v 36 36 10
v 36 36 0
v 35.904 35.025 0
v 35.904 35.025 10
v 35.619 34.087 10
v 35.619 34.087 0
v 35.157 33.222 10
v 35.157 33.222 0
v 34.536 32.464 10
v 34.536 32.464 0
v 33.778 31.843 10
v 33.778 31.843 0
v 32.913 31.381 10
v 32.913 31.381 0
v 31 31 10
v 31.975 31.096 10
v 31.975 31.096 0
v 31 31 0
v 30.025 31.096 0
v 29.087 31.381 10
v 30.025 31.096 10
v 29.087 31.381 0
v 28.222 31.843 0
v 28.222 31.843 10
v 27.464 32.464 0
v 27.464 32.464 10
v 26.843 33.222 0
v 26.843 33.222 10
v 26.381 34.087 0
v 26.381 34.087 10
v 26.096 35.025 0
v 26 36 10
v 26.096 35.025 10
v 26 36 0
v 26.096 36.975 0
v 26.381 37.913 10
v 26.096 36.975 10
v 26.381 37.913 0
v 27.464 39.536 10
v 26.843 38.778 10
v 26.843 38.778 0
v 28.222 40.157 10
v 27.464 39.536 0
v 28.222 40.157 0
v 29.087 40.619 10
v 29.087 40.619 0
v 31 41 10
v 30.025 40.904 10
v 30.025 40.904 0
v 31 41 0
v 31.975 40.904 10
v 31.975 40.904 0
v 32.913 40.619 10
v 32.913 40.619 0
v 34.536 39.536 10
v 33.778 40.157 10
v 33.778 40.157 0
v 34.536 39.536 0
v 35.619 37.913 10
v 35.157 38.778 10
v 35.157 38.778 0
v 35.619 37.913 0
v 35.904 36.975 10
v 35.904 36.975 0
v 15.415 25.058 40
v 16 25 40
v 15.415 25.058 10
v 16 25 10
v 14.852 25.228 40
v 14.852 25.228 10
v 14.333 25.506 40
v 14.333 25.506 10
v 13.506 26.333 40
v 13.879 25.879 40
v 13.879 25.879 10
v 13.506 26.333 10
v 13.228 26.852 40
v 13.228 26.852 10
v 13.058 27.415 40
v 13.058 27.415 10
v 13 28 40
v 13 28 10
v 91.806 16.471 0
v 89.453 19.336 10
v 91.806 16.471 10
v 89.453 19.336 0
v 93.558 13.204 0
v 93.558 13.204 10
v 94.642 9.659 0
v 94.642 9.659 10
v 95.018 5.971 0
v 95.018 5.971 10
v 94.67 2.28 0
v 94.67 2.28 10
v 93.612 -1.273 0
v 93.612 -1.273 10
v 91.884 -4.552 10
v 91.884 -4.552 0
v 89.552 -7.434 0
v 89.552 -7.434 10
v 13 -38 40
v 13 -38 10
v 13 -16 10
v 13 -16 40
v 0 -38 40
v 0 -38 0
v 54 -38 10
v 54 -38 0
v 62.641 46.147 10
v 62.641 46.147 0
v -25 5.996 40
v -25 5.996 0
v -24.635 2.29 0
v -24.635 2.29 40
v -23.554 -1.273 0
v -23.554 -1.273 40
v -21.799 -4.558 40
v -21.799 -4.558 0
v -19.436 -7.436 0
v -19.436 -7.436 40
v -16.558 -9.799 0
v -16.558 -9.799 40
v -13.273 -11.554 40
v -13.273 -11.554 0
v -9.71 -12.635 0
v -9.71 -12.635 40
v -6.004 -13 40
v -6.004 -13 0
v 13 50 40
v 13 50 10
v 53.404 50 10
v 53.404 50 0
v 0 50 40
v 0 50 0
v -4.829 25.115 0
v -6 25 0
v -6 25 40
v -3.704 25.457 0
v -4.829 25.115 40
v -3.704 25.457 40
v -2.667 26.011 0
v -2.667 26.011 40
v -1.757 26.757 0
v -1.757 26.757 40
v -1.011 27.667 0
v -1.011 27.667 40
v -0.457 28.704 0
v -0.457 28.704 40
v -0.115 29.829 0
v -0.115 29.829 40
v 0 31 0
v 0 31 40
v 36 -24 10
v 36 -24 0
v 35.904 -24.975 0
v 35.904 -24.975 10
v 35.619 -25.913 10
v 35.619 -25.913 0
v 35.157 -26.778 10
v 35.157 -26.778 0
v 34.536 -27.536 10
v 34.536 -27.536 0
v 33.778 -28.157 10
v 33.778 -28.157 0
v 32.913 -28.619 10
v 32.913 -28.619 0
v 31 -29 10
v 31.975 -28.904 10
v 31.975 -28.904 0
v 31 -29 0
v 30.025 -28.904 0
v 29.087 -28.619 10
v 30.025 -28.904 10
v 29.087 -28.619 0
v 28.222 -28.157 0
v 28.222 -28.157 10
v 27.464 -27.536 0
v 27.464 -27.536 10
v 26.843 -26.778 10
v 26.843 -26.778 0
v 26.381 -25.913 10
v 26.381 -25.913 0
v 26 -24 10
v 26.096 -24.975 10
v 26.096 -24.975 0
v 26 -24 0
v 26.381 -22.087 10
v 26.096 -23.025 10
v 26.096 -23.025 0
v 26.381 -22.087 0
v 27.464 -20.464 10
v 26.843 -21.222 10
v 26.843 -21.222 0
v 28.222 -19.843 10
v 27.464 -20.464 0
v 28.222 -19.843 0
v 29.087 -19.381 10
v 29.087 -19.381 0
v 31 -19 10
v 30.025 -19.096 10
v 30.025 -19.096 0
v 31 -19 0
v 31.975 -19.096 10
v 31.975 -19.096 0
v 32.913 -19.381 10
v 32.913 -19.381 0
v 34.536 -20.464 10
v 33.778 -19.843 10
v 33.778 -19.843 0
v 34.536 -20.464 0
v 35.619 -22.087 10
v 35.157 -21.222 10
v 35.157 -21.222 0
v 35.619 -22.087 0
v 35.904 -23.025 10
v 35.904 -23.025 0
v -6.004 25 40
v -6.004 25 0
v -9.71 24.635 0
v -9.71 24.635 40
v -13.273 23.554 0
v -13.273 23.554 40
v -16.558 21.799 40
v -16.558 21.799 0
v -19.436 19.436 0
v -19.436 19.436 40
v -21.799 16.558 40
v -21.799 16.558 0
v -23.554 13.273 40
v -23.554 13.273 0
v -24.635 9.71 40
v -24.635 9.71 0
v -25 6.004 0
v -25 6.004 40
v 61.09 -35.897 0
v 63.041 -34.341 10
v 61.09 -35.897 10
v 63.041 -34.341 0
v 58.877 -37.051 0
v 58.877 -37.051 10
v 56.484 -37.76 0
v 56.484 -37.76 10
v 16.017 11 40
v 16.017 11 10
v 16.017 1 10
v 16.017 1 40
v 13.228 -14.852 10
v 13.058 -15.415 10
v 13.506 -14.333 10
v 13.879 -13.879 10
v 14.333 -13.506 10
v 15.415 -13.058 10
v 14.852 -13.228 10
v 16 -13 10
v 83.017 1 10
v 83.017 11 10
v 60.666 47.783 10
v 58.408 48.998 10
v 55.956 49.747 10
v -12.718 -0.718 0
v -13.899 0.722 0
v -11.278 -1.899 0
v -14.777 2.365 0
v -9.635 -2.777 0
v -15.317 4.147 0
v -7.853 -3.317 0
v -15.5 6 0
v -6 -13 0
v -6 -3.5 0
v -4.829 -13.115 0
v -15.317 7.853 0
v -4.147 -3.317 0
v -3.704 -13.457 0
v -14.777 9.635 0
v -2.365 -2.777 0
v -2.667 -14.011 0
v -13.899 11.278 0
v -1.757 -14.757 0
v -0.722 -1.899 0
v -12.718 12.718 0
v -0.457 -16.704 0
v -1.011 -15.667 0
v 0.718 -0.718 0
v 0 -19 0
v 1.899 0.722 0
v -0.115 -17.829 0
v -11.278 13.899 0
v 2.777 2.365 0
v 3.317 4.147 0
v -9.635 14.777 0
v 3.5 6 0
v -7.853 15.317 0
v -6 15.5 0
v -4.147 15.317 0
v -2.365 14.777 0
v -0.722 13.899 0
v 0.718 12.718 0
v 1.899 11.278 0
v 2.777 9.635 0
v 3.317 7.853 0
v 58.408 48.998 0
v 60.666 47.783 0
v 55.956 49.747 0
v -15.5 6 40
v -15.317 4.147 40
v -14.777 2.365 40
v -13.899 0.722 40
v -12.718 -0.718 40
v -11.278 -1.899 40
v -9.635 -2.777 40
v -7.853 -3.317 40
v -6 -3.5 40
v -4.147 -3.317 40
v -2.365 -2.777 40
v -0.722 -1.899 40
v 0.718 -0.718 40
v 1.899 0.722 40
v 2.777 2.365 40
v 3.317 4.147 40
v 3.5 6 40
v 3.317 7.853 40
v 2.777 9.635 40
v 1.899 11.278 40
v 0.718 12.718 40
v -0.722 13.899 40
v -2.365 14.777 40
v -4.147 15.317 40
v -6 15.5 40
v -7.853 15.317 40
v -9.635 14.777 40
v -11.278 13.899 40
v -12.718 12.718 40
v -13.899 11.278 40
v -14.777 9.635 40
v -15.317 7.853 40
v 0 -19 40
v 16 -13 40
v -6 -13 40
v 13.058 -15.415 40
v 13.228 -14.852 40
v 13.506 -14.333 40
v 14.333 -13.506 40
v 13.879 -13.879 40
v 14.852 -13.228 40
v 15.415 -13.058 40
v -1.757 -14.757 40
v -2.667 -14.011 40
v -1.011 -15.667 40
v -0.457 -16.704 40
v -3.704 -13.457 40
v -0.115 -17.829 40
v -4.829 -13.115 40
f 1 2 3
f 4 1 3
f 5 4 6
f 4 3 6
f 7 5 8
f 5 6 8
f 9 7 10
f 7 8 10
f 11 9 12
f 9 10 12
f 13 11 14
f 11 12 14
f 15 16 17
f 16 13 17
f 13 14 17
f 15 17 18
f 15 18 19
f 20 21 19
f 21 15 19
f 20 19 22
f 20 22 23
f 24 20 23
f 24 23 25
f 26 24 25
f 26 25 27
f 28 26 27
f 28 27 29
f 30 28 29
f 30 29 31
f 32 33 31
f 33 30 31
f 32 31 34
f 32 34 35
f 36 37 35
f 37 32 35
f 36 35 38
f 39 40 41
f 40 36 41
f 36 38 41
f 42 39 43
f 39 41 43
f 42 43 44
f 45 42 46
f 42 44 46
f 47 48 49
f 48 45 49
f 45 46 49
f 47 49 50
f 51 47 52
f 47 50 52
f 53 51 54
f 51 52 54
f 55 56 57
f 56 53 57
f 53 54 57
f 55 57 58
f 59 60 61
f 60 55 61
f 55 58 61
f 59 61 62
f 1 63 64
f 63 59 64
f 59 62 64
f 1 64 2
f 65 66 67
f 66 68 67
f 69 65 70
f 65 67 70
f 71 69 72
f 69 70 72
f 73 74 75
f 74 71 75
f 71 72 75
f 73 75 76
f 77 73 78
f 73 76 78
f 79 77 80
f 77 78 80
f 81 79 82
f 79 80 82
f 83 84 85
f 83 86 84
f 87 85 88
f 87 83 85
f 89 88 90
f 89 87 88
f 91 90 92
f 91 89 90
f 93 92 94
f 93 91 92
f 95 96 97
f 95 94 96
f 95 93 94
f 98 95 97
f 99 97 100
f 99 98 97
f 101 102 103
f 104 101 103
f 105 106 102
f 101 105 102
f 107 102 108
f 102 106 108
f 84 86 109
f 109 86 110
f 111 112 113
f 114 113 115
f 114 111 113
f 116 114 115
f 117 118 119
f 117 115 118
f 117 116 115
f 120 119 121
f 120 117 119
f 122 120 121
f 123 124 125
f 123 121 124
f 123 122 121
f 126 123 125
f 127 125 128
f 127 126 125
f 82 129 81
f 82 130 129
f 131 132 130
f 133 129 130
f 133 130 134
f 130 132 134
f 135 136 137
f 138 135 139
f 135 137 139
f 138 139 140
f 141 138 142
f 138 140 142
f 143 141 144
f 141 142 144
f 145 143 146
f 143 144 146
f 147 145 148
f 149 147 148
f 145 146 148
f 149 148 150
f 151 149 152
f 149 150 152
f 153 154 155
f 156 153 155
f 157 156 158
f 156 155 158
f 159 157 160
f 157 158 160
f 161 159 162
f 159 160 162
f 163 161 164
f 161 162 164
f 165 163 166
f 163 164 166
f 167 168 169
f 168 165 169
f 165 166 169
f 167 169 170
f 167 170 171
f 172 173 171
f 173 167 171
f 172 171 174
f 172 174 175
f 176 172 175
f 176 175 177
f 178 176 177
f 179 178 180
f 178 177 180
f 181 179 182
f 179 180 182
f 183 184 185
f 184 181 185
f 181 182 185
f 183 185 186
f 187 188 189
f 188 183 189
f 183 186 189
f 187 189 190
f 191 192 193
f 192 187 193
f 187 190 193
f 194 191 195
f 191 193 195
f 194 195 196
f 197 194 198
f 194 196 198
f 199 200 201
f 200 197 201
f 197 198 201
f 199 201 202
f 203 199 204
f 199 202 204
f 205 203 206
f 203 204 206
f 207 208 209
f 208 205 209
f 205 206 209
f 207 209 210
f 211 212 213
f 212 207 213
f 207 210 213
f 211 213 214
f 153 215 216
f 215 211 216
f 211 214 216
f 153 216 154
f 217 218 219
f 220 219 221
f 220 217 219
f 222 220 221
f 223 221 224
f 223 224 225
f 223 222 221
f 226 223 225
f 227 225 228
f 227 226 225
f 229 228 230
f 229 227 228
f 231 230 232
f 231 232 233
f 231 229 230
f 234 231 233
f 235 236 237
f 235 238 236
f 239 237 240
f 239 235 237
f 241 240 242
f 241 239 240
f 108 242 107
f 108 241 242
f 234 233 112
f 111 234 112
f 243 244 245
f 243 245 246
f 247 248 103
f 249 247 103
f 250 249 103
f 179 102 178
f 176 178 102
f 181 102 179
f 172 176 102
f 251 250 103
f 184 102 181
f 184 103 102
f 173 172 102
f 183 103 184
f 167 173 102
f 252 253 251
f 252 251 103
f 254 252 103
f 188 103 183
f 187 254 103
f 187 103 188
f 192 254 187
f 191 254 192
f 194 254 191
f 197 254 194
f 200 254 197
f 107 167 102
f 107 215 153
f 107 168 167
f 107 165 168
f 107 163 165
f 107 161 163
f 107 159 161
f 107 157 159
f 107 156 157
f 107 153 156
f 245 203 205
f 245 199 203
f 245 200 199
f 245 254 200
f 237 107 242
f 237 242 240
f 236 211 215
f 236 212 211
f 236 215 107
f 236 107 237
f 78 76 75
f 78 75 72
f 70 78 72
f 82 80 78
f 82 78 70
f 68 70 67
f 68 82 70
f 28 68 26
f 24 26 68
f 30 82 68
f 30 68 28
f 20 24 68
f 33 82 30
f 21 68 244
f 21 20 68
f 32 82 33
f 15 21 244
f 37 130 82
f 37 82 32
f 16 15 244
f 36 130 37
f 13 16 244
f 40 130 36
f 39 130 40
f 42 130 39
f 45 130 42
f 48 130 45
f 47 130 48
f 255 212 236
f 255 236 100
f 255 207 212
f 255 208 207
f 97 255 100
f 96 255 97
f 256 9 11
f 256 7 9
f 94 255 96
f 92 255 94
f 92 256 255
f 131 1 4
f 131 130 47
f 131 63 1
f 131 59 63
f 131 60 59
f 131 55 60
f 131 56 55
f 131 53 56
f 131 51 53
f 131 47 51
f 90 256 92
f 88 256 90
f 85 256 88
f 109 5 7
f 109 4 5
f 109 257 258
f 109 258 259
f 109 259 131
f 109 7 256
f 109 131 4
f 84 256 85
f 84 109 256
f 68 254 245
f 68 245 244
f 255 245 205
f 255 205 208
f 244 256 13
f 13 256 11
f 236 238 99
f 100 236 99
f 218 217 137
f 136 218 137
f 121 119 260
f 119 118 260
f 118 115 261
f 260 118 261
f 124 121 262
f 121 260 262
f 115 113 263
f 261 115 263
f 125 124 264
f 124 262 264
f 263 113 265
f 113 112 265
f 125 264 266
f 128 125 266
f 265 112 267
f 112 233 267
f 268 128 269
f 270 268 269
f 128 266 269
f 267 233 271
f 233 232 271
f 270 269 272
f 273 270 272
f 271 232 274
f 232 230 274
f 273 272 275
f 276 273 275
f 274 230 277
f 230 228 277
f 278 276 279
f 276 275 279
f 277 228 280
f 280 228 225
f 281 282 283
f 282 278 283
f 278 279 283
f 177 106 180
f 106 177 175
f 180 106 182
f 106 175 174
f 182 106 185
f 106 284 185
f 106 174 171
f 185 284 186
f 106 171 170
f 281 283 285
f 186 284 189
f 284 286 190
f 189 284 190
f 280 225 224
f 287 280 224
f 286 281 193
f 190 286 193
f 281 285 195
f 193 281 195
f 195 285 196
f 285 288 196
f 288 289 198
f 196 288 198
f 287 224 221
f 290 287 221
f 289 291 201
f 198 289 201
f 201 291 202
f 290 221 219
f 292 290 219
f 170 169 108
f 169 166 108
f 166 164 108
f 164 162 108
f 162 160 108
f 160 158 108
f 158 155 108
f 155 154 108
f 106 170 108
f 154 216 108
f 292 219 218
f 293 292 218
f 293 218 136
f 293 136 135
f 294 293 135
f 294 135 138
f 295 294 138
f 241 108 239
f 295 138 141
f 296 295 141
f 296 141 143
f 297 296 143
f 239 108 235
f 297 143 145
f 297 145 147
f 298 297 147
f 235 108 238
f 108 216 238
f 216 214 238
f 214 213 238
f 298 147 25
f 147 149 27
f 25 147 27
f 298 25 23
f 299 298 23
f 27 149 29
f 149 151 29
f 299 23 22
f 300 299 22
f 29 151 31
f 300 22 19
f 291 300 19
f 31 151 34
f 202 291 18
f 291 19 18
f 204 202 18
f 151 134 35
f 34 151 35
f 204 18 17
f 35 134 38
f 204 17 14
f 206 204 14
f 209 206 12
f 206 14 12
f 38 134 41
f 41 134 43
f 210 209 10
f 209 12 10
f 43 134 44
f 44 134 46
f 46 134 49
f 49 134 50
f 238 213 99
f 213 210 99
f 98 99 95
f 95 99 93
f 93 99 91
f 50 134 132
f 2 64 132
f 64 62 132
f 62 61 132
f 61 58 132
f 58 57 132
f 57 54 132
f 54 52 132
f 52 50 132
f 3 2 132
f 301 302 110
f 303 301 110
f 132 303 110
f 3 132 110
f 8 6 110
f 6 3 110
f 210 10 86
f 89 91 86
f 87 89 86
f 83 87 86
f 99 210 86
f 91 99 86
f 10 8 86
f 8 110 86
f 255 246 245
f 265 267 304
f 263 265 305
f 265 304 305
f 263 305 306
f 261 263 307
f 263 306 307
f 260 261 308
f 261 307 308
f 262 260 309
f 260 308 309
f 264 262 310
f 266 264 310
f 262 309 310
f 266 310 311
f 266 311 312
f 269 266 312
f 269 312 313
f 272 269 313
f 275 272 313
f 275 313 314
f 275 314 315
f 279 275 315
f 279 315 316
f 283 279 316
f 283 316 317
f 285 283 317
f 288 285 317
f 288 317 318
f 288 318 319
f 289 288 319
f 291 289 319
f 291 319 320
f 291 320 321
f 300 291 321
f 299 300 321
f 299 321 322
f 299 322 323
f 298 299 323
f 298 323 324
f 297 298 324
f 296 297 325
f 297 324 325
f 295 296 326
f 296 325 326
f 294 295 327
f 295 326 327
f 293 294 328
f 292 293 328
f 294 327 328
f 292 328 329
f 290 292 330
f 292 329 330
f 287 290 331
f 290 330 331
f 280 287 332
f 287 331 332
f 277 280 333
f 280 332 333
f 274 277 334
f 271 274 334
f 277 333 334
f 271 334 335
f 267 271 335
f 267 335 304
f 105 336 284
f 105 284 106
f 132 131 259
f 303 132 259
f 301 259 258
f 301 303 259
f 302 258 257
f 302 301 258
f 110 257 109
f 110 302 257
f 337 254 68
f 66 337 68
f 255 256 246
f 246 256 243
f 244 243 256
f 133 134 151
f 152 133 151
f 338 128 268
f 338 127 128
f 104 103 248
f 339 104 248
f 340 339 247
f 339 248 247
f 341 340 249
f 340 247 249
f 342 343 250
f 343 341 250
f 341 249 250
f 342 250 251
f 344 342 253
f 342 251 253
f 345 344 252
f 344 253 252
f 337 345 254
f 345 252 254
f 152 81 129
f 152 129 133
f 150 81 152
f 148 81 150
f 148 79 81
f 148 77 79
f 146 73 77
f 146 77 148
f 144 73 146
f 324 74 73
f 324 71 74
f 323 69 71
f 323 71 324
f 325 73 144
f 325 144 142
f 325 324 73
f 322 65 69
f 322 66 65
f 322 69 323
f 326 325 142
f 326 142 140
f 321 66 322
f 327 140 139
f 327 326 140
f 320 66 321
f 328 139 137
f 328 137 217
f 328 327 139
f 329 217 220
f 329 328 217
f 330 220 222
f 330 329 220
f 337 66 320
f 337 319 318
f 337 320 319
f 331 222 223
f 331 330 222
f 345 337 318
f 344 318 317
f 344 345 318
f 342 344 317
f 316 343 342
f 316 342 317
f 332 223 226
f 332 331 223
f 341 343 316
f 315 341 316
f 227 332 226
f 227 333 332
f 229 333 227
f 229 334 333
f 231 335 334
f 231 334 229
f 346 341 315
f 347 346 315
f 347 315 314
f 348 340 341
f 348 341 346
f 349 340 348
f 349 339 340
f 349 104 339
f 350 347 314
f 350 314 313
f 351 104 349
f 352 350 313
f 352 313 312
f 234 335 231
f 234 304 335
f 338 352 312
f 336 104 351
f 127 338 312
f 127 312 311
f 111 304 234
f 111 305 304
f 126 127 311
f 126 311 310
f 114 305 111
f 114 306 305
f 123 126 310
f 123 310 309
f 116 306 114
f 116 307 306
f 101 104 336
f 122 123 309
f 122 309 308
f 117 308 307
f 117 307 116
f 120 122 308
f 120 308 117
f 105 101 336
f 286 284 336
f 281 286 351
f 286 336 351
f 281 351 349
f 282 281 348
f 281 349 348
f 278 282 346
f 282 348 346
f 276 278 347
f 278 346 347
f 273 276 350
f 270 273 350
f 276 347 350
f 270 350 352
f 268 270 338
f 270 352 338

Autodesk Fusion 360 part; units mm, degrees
sketch "Sketch1" plane through (0, 0, 0) normal (0, 0, 1) x (1, 0, 0)
  line L0 (0, 50) -> (53.404, 50)
  line L1 (54, -38) -> (0, -38)
  line L2 (0, -38) -> (0, 50)
  arc A0 (54, -38) -> (63.0412, -34.3412) centre (54, -25) ccw
  arc A1 (62.6413, 46.1473) -> (53.404, 50) centre (53.404, 37) ccw
  line L3 (63.0412, -34.3412) -> (89.552, -7.4343)
  line L4 (89.4528, 19.3358) -> (62.6413, 46.1473)
  arc A2 (89.552, -7.4343) -> (89.4528, 19.3358) centre (76.0178, 5.9008) ccw
  circle A3 centre (31, -24) radius 5
  circle A4 centre (31, 36) radius 5
  dimension "d2" = 88
  dimension "d6" = 13
  dimension "d7" = 13
  dimension "d10" = 19
  dimension "d13" = 10
  dimension "d15" = 10
extrude "Extrude1" add sketch "Sketch1" along normal blind 10 makes body 1
sketch "Sketch2" plane through (0, 0, 10) normal (0, 0, 1) x (-1, 0, 0)
  circle A0 centre (-31, -36) radius 5
  circle A1 centre (-31, 24) radius 5
  arc A2 (-54, 38) -> (-63.0412, 34.3412) centre (-54, 25) ccw
  line L0 (-63.0412, 34.3412) -> (-89.552, 7.4343)
  arc A3 (-89.552, 7.4343) -> (-89.4528, -19.3358) centre (-76.0178, -5.9008) ccw
  line L1 (-89.4528, -19.3358) -> (-62.6413, -46.1473)
  arc A4 (-62.6413, -46.1473) -> (-53.404, -50) centre (-53.404, -37) ccw
  line L2 (-53.404, -50) -> (0, -50)
  line L3 (0, -50) -> (0, 38)
  line L4 (0, 38) -> (-54, 38)
  line L5 (0, 38) -> (-13, 38)
  line L6 (-13, 38) -> (-13, 16)
  line L7 (0, 13) -> (0, 38)
  line L8 (0, -50) -> (-13, -50)
  line L9 (-13, -50) -> (-13, -28)
  line L10 (0, -25) -> (0, -50)
  line L11 (-13, -25) -> (-16, -25)
  line L12 (-16, -25) -> (-16, -25)
  line L13 (25, -25) -> (25, 13)
  line L14 (-16, 13) -> (-16, 13)
  line L15 (-16, 13) -> (-16, -25)
  arc A5 (-16, 13) -> (-13, 16) centre (-16, 16) ccw
  arc A6 (-13, -28) -> (-16, -25) centre (-16, -28) ccw
  line L16 (25, 13) -> (6, 13)
  line L17 (25, -25) -> (0, -25)
  line L18 (0, -50) -> (0, -31)
  line L19 (6, -25) -> (25, -25)
  line L20 (25, -25) -> (25, 13)
  line L21 (25, 13) -> (0, 13)
  line L22 (0, 19) -> (0, 38)
  arc A7 (0, 19) -> (6, 13) centre (6, 19) ccw
  arc A8 (6, -25) -> (0, -31) centre (6, -31) ccw
  dimension "d18" = 13
  dimension "d19" = 25
  dimension "d20" = 13
  dimension "d21" = 25
  dimension "d23" = 41
  dimension "d24" = 3
  dimension "d25" = 3
  dimension "d26" = 6
  dimension "d27" = 6
extrude "Extrude2" add sketch "Sketch2" against normal blind 10 contours L3 L7 L21 A7 | L3 L13 L16 L17 L19 L20 L21 | L3 L10 L17 A8 bodies 1
extrude "Extrude3" add sketch "Sketch2" along normal blind 30 contours L3 L7 L21 A7 | L3 L13 L16 L17 L19 L20 L21 | L3 L10 L17 A8 bodies 1
extrude "Extrude4" add sketch "Sketch2" along normal blind 30 contours L2 L3 L4 L5 L6 L7 L8 L9 L10 L15 A5 A6 L18 L22 bodies 1
fillet "Fillet1" radius 19 2 edges at (-25, -13, 20) (-25, 25, 20) on bodies 1
sketch "Sketch3" plane through (0, 0, 40) normal (0, 0, 1) x (-1, 0, 0)
  arc A0 (6, -25) -> (25, -6) centre (6, -6) ccw
  arc A1 (25, -6) -> (6, 13) centre (6, -6) ccw
  arc A2 (0, 19) -> (6, 13) centre (6, 19) ccw
  line L0 (0, 19) -> (0, 38)
  line L1 (0, 38) -> (-13, 38)
  line L2 (-13, 38) -> (-13, 16)
  arc A3 (-16, 13) -> (-13, 16) centre (-16, 16) ccw
  line L3 (-16, 13) -> (-16, -25)
  arc A4 (-13, -28) -> (-16, -25) centre (-16, -28) ccw
  line L4 (-13, -28) -> (-13, -50)
  line L5 (-13, -50) -> (0, -50)
  line L6 (0, -50) -> (0, -31)
  arc A5 (6, -25) -> (0, -31) centre (6, -31) ccw
  circle A6 centre (6, -6) radius 9.5
  dimension "d36" = 19
extrude "Extrude5" cut sketch "Sketch3" against normal blind 40 contours A6 bodies 1
sketch "Sketch4" plane through (0, -38, 0) normal (0, -1, 0) x (1, 0, 0)
  line L0 (0, 0) -> (54, 0)
  line L1 (54, 0) -> (54, 10)
  line L2 (54, 10) -> (13, 10)
  line L3 (13, 10) -> (13, 40)
  line L4 (13, 40) -> (0, 40)
  line L5 (0, 40) -> (0, 0)
  line L6 (16.0173, 10) -> (83.0173, 10)
  line L7 (16.0173, 10) -> (16.0173, 40)
  line L8 (83.0173, 10) -> (16.0173, 40)
  dimension "d39" = 67
  dimension "d40" = 30
extrude "Extrude6" add sketch "Sketch4" along normal blind 10 separate body contours L2 L6 L7 L8 makes body 2
move_body "Move1" bodies 2 to x (1, 0, 0) y (0, 1, 0) z (0, 0, 1) at (0, 49, 0)
combine "Combine1" operation add target body 1 tool bodies 2
